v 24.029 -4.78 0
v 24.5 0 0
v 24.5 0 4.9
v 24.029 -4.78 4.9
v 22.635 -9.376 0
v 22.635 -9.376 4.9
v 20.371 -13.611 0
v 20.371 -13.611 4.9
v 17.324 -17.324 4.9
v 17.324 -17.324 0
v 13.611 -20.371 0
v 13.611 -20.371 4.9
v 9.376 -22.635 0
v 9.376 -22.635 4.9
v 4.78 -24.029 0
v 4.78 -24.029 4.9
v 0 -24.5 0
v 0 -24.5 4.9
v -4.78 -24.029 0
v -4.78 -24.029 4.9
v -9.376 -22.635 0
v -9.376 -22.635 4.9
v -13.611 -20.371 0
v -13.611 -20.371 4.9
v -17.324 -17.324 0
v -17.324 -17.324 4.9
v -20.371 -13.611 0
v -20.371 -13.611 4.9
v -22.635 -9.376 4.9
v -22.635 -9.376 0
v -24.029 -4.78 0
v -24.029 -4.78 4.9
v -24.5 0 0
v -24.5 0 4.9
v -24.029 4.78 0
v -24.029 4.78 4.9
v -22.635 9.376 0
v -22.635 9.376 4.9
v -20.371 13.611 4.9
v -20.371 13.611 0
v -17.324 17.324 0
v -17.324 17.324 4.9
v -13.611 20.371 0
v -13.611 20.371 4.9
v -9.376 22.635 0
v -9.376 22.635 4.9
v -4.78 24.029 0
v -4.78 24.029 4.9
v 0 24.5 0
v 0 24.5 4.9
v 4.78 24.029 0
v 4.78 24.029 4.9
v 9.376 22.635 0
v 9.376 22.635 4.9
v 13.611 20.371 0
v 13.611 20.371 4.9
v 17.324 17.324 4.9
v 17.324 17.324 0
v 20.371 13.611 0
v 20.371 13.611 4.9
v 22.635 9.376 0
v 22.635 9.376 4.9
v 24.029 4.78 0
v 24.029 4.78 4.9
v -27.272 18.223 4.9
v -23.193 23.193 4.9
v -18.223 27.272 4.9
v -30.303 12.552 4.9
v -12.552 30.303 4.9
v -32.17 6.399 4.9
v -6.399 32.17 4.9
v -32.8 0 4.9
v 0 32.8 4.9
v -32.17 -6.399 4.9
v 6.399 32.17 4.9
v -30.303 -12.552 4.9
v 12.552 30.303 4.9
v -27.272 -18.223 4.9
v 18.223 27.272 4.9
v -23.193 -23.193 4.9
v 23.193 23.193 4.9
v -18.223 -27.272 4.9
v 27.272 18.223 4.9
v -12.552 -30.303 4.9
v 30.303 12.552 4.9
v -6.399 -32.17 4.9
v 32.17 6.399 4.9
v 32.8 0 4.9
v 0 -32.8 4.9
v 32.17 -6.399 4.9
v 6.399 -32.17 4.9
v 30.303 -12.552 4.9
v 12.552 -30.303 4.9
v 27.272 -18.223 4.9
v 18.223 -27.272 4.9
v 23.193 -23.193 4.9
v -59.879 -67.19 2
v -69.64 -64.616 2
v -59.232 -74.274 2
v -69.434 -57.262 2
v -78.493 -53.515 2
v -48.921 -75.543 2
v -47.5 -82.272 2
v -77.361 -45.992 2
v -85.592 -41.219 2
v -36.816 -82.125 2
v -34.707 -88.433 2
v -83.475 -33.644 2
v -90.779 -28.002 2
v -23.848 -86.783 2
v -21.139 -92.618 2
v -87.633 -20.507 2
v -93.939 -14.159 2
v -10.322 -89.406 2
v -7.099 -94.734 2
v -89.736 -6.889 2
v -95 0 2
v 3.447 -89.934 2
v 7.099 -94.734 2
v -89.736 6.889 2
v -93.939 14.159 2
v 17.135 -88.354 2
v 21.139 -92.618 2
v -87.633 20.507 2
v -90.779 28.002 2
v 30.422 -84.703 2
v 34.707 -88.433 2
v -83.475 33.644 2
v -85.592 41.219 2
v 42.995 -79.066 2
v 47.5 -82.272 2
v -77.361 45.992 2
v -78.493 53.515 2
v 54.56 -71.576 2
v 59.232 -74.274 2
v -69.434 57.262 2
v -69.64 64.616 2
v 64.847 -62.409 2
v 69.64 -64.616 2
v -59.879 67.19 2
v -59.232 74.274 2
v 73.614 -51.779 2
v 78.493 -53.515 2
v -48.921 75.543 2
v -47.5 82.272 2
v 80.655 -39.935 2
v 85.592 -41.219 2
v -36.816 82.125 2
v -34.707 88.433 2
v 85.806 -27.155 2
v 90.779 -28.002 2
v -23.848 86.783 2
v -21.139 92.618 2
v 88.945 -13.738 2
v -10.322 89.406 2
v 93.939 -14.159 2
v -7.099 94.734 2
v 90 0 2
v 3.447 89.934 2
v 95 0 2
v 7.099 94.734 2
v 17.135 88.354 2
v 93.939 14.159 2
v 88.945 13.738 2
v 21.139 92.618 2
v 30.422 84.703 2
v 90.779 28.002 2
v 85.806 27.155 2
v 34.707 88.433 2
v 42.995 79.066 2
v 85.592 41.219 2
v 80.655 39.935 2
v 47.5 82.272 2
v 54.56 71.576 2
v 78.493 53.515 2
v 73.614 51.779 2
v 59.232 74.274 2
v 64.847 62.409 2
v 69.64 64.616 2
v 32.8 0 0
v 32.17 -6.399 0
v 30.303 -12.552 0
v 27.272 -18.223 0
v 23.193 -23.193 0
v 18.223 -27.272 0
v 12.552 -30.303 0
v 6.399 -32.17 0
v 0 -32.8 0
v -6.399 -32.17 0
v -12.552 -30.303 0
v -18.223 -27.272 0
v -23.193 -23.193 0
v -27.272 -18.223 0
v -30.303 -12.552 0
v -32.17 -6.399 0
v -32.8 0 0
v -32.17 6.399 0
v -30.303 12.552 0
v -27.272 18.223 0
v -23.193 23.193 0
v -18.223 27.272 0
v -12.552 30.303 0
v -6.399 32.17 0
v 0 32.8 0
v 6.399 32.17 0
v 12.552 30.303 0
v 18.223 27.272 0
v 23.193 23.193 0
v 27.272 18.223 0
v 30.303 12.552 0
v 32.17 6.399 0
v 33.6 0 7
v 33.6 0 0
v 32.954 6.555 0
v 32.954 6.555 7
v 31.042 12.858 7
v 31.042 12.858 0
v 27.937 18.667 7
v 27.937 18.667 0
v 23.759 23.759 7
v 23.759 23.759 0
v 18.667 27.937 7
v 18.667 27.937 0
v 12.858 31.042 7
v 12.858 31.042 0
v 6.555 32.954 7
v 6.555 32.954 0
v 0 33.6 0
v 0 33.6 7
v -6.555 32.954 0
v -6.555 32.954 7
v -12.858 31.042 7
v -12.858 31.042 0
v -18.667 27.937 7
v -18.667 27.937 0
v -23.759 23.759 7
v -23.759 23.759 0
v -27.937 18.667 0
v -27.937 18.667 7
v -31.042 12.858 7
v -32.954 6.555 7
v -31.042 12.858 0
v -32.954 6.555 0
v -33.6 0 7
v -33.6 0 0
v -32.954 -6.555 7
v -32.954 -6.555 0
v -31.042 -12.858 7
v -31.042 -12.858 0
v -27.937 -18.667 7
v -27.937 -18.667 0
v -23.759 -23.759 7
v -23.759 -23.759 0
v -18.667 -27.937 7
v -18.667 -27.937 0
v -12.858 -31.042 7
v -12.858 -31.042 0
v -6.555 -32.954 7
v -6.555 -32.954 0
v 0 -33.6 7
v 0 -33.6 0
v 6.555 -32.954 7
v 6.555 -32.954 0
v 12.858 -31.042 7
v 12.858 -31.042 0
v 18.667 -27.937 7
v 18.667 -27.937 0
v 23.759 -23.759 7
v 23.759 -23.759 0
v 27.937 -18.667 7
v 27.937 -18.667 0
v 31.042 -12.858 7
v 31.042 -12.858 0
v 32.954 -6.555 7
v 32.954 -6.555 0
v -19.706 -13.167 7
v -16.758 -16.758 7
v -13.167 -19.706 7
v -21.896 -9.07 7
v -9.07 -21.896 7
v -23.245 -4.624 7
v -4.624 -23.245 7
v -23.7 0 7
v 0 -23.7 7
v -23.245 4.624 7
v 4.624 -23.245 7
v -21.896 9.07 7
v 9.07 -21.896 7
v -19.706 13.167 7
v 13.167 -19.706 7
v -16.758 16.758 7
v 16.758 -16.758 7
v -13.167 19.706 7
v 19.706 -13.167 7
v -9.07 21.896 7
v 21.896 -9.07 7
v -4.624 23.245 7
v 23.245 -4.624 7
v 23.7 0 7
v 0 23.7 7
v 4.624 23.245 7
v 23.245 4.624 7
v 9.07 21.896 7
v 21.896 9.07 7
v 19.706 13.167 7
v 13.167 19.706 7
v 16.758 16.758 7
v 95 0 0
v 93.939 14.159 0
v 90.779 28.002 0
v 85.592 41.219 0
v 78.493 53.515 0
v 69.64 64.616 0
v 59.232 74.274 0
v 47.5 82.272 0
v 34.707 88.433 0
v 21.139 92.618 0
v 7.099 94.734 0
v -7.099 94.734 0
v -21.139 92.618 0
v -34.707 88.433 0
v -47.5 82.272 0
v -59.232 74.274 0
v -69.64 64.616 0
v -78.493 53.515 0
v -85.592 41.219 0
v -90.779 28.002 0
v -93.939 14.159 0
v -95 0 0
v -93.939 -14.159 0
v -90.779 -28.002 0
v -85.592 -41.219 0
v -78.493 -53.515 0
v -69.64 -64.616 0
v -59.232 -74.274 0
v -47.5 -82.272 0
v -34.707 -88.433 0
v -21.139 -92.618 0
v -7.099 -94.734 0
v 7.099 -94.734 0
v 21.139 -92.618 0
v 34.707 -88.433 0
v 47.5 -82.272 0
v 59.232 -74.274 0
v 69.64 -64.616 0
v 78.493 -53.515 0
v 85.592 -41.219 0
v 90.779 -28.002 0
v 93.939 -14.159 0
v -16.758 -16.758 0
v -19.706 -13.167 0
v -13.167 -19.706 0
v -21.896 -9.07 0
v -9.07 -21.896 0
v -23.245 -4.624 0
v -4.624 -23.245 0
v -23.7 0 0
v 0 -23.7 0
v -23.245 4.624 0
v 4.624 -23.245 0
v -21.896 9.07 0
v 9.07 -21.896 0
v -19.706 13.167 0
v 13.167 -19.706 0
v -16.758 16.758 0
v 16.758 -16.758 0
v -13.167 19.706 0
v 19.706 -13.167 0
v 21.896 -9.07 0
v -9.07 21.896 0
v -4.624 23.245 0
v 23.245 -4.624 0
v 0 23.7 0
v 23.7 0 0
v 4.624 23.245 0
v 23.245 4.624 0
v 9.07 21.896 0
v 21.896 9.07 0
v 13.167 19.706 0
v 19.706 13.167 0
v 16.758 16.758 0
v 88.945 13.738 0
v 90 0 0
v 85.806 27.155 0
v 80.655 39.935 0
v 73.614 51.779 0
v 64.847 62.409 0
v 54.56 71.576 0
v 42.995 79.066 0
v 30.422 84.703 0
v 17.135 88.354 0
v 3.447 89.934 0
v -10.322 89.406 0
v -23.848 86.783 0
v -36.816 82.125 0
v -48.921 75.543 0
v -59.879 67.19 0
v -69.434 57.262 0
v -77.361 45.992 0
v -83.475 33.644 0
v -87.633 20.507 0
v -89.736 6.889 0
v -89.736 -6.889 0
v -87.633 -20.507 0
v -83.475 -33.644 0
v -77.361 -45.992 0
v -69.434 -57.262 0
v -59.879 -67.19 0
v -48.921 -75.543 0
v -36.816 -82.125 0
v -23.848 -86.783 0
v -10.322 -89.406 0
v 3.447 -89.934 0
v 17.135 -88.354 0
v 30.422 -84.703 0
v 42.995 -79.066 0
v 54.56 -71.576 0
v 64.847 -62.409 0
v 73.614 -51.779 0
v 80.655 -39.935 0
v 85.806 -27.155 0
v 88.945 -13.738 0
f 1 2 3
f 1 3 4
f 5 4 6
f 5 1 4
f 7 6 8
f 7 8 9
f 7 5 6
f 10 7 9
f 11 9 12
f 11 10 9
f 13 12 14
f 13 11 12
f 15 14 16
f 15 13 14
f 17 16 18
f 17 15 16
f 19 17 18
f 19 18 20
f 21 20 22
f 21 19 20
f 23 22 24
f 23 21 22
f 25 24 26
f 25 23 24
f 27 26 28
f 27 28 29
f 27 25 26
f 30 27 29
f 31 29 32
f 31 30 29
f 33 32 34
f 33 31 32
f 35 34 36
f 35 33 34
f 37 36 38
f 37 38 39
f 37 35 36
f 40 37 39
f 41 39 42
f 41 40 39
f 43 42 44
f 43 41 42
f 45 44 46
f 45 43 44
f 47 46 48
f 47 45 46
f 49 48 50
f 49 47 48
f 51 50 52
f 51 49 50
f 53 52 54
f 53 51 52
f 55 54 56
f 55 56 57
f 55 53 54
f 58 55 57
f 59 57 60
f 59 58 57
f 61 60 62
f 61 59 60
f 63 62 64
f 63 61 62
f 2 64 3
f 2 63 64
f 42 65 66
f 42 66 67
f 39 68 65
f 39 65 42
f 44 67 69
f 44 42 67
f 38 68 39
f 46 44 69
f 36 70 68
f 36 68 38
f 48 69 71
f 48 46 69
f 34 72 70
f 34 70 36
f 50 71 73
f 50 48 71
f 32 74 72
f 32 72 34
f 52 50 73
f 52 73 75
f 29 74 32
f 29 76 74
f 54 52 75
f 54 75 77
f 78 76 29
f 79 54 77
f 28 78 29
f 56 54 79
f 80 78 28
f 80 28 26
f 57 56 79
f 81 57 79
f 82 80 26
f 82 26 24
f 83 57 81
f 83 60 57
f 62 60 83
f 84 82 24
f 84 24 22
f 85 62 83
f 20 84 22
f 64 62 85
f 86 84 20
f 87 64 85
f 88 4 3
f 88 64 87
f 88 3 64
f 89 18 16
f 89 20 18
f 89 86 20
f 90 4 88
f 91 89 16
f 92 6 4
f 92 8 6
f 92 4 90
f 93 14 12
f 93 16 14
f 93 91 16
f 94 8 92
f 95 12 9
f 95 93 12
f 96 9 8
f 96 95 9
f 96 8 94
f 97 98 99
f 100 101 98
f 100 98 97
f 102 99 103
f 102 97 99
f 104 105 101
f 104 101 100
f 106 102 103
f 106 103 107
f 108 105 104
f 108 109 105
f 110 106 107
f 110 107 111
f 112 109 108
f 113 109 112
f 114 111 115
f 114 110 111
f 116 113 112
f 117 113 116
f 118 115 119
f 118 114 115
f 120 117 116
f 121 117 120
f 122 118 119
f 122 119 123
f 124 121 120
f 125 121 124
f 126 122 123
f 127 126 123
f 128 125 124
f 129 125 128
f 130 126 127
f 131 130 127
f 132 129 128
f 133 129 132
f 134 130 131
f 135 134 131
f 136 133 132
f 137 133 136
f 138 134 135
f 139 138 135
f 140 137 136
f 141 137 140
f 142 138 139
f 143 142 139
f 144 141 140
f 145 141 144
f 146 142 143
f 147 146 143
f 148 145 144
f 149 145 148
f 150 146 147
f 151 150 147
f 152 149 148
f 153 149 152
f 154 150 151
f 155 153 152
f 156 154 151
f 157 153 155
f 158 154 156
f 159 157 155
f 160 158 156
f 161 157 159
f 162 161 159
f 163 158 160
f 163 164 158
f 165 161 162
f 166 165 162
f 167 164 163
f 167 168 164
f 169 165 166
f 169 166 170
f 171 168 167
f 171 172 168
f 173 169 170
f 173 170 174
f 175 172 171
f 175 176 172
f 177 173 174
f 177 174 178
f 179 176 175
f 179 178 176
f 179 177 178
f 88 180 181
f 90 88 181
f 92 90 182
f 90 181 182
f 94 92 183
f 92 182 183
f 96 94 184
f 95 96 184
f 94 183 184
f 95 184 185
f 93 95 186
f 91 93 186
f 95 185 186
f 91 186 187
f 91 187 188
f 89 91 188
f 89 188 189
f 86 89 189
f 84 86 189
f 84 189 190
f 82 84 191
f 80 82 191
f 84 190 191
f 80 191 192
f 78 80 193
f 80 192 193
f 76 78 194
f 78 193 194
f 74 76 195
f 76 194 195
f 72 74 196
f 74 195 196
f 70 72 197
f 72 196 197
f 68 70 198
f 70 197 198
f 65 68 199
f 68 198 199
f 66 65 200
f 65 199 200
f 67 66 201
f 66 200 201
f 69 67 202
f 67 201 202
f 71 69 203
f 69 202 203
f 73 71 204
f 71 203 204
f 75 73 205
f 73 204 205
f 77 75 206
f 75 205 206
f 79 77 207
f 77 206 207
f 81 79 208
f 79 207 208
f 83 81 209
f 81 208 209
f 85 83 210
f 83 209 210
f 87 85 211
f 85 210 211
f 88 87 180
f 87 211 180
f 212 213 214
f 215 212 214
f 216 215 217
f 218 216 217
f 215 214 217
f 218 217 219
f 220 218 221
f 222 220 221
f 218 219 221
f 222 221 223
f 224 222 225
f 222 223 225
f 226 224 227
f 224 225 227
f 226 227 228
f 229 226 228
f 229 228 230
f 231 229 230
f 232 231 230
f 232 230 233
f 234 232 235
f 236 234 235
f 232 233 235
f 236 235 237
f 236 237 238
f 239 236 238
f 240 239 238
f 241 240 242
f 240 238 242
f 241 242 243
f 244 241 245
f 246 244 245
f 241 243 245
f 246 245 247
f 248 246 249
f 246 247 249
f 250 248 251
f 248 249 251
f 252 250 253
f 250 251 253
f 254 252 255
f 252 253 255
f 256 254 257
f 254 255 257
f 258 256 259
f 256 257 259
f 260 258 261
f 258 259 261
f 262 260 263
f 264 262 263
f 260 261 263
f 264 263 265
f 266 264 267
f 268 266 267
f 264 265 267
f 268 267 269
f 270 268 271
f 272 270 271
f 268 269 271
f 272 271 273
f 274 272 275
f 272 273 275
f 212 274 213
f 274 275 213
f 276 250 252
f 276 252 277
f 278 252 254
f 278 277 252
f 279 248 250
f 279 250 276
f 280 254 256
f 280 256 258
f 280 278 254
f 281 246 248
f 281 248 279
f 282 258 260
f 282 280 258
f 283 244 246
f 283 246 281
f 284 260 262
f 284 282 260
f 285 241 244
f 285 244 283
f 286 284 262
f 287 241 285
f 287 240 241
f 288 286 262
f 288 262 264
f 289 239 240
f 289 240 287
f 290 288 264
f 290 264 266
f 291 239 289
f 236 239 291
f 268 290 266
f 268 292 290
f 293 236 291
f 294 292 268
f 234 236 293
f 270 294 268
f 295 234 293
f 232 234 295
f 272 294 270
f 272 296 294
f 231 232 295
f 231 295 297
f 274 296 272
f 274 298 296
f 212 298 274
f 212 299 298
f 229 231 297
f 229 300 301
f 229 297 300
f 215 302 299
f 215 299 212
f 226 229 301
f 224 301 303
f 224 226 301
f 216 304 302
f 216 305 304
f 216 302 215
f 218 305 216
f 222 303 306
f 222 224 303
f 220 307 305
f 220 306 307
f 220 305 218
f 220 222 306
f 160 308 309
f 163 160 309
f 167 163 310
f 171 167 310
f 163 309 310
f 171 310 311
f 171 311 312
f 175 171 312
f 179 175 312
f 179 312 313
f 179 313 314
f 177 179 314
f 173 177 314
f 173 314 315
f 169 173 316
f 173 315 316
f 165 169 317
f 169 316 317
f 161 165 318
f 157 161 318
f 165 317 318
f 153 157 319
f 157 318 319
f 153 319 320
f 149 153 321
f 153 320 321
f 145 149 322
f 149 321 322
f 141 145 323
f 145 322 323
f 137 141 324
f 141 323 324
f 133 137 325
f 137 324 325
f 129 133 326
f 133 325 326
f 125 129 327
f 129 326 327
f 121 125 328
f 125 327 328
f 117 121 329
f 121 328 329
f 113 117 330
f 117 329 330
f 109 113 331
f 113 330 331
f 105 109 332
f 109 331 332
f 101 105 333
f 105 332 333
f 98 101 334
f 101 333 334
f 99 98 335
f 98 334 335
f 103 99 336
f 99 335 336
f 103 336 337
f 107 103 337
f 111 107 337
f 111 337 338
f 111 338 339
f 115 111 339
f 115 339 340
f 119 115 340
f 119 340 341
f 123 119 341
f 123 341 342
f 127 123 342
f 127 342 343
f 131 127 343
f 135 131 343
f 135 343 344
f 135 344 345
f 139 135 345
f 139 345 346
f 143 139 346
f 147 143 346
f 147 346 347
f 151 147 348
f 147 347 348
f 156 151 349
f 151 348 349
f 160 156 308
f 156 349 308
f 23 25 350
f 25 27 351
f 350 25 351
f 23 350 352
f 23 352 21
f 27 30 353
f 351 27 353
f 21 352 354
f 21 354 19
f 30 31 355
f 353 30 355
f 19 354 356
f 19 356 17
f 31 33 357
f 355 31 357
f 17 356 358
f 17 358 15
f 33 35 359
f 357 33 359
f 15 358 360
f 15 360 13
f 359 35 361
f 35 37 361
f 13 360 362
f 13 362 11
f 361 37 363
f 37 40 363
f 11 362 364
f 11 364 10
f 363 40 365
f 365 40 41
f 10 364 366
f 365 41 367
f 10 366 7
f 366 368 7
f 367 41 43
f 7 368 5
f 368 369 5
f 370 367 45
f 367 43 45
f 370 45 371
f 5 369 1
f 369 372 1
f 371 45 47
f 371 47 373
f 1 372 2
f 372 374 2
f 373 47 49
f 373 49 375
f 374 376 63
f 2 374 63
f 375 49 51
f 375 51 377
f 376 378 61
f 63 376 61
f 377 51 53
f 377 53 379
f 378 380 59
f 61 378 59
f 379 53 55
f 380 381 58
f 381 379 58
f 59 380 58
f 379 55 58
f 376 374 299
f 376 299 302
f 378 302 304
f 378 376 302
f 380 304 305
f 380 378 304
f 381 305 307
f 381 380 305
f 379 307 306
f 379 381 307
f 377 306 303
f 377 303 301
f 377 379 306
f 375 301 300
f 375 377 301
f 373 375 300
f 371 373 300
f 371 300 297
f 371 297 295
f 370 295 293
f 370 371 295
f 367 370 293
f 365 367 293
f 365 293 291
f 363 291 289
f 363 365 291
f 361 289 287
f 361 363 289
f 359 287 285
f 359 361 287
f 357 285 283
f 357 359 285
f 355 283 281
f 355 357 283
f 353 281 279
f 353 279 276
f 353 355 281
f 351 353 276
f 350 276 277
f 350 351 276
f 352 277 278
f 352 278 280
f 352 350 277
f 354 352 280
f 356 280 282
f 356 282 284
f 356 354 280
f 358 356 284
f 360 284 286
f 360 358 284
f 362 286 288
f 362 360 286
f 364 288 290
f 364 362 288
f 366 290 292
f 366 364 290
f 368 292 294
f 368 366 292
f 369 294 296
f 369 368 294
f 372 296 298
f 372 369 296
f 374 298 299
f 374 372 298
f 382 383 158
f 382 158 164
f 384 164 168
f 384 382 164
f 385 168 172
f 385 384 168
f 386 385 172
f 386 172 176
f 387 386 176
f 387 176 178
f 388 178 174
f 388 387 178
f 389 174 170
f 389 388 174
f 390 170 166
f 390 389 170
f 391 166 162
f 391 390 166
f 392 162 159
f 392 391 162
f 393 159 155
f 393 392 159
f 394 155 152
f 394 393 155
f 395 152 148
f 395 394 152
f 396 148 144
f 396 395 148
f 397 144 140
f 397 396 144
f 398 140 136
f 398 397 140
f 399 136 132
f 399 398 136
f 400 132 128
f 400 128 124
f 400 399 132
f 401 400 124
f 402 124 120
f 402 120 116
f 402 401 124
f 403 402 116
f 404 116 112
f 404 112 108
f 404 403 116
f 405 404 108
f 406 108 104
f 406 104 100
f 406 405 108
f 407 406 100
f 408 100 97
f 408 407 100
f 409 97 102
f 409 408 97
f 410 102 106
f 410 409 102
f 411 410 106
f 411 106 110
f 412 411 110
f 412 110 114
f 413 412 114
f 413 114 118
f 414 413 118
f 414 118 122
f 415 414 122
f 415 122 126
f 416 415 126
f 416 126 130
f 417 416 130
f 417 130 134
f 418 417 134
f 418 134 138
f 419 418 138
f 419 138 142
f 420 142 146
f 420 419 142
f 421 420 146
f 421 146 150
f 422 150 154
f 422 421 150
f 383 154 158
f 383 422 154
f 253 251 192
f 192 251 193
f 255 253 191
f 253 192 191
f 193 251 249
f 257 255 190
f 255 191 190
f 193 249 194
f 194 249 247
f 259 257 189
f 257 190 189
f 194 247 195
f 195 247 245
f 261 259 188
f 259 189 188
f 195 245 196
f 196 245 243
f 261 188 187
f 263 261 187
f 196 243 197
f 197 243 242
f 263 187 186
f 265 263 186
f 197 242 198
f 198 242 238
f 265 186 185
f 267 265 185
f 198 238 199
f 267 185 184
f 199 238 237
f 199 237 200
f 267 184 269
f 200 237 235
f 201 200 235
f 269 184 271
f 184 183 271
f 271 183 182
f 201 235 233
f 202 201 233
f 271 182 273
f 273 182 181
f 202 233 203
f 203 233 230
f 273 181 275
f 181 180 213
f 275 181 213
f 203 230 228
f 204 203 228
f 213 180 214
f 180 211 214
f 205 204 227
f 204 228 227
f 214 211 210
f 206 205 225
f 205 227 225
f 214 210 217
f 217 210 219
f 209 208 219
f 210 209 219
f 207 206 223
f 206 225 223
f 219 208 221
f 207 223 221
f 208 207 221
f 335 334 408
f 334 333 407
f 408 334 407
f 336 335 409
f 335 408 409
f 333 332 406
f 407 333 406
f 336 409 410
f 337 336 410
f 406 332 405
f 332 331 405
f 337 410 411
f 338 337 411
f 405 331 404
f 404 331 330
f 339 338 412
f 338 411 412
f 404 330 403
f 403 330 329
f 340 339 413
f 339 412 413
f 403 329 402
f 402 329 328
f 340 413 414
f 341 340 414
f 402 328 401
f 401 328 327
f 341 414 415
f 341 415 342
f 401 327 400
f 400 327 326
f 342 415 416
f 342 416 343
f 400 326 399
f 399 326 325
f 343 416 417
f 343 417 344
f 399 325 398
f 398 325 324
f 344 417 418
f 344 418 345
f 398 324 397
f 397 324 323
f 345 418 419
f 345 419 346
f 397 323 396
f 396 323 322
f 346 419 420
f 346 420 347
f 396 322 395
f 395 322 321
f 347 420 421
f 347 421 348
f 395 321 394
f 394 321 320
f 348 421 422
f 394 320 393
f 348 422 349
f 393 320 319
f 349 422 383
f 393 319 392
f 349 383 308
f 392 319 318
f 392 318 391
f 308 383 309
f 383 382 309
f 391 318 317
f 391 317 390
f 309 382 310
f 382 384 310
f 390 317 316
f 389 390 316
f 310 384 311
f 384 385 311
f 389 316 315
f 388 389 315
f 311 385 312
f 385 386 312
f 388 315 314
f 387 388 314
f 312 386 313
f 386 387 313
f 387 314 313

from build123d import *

# Parameters (mm, degrees)
F0_R     = 95
F0_R_2   = 90
F1_DEPTH = 2
F0_R_3   = 33.6
F0_R_4   = 23.7
F2_DEPTH = 7
F3_R     = 32.8
F3_R_2   = 24.5
F4_DEPTH = 4.9


with BuildPart() as f1:
    # F0 (on Top) → F1 (new body)
    with BuildSketch(Plane.XY):
        Circle(F0_R)
        Circle(F0_R_2, mode=Mode.SUBTRACT)
    extrude(amount=F1_DEPTH)


with BuildPart() as f2:
    # F0 (on Top) → F2 (new body)
    with BuildSketch(Plane.XY):
        Circle(F0_R_3)
        Circle(F0_R_4, mode=Mode.SUBTRACT)
    extrude(amount=F2_DEPTH)

    # F3 (on face) → F4 (cut)
    with BuildSketch(Plane(origin=(0, 0, 0), x_dir=(1, 0, 0), z_dir=(0, 0, -1))):
        Circle(F3_R)
        Circle(F3_R_2, mode=Mode.SUBTRACT)
    extrude(amount=-F4_DEPTH, mode=Mode.SUBTRACT)


solid = Compound([f1.part, f2.part])
